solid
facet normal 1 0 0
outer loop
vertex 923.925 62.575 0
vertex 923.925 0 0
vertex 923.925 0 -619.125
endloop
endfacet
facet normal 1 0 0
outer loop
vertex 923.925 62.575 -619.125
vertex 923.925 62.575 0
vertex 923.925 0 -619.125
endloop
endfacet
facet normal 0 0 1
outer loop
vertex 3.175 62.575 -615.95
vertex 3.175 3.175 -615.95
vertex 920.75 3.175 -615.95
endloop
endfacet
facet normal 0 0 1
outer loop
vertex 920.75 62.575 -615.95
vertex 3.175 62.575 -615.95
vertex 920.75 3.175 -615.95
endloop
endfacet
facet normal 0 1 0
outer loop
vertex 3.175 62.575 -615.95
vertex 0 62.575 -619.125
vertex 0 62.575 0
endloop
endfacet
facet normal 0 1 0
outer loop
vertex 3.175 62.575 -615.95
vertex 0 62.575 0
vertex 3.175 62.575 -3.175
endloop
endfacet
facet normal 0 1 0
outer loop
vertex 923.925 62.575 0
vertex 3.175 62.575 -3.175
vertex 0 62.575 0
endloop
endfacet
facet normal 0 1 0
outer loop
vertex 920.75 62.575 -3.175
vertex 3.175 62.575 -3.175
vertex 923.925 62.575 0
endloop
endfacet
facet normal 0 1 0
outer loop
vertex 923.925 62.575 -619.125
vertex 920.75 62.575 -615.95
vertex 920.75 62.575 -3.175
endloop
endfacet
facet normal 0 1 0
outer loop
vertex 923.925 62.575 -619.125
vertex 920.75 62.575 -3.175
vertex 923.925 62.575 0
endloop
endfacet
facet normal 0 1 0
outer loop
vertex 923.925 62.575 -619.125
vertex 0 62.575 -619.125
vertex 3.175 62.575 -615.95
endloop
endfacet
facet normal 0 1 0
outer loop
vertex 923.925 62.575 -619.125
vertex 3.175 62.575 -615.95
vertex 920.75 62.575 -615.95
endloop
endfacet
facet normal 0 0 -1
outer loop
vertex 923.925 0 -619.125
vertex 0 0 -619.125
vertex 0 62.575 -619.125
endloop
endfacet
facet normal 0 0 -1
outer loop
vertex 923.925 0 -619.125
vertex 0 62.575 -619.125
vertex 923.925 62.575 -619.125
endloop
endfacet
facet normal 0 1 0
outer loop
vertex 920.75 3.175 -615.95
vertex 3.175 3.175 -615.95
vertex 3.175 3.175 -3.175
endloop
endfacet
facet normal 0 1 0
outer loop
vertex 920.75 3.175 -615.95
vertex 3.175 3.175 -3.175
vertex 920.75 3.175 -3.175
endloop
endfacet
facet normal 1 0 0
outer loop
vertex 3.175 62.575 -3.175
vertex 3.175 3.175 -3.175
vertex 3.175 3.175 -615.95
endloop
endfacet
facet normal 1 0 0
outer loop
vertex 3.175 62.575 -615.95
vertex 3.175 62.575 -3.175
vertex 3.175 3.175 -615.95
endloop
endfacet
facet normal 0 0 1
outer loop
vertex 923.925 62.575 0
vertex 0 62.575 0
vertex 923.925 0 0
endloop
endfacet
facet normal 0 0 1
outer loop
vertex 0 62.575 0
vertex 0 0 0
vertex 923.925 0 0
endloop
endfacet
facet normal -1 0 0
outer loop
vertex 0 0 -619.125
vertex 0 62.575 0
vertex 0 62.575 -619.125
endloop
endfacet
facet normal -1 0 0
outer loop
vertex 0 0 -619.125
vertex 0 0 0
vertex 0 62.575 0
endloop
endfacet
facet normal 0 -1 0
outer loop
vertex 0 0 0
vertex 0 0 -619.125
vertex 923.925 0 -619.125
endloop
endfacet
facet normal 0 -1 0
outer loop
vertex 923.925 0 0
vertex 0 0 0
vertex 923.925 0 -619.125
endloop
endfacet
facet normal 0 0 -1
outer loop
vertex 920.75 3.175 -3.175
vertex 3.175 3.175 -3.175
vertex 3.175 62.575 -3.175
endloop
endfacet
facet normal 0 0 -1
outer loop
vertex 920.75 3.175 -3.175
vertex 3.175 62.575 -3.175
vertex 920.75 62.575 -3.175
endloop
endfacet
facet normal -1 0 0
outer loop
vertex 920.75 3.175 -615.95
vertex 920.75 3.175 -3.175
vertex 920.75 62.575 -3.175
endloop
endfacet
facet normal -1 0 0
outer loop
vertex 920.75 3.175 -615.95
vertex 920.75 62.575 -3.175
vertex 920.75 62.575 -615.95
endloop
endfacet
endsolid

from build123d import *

# Parameters (mm, degrees)
SKETCH1_W           = 923.925
SKETCH1_H           = 619.125
BOSS_EXTRUDE1_DEPTH = 3.175
SKETCH2_W           = 3.175
SKETCH2_H           = 619.125
BOSS_EXTRUDE2_DEPTH = 59.4
SKETCH3_W           = 917.575
SKETCH3_H           = 3.175
BOSS_EXTRUDE3_DEPTH = 59.4


with BuildPart() as part:
    # Sketch1 → Boss-Extrude1 (new body)
    with BuildSketch(Plane(origin=(0, 0, 0), x_dir=(1, 0, 0), z_dir=(0, 1, 0))):
        with Locations((461.9625, 309.5625)):
            Rectangle(SKETCH1_W, SKETCH1_H)
    extrude(amount=BOSS_EXTRUDE1_DEPTH)

    # Sketch2 → Boss-Extrude2 (add)
    with BuildSketch(Plane(origin=(0, 3.175, 0), x_dir=(1, 0, 0), z_dir=(0, 1, 0))):
        with Locations((1.5875, 309.5625)):
            Rectangle(SKETCH2_W, SKETCH2_H)
        with Locations((922.3375, 309.5625)):
            Rectangle(SKETCH2_W, SKETCH2_H)
    extrude(amount=BOSS_EXTRUDE2_DEPTH)

    # Sketch3 → Boss-Extrude3 (add)
    with BuildSketch(Plane(origin=(0, 3.175, 0), x_dir=(1, 0, 0), z_dir=(0, 1, 0))):
        with Locations((461.9625, 1.5875)):
            Rectangle(SKETCH3_W, SKETCH3_H)
        with Locations((461.9625, 617.5375)):
            Rectangle(SKETCH3_W, SKETCH3_H)
    extrude(amount=BOSS_EXTRUDE3_DEPTH)


solid = part.part
